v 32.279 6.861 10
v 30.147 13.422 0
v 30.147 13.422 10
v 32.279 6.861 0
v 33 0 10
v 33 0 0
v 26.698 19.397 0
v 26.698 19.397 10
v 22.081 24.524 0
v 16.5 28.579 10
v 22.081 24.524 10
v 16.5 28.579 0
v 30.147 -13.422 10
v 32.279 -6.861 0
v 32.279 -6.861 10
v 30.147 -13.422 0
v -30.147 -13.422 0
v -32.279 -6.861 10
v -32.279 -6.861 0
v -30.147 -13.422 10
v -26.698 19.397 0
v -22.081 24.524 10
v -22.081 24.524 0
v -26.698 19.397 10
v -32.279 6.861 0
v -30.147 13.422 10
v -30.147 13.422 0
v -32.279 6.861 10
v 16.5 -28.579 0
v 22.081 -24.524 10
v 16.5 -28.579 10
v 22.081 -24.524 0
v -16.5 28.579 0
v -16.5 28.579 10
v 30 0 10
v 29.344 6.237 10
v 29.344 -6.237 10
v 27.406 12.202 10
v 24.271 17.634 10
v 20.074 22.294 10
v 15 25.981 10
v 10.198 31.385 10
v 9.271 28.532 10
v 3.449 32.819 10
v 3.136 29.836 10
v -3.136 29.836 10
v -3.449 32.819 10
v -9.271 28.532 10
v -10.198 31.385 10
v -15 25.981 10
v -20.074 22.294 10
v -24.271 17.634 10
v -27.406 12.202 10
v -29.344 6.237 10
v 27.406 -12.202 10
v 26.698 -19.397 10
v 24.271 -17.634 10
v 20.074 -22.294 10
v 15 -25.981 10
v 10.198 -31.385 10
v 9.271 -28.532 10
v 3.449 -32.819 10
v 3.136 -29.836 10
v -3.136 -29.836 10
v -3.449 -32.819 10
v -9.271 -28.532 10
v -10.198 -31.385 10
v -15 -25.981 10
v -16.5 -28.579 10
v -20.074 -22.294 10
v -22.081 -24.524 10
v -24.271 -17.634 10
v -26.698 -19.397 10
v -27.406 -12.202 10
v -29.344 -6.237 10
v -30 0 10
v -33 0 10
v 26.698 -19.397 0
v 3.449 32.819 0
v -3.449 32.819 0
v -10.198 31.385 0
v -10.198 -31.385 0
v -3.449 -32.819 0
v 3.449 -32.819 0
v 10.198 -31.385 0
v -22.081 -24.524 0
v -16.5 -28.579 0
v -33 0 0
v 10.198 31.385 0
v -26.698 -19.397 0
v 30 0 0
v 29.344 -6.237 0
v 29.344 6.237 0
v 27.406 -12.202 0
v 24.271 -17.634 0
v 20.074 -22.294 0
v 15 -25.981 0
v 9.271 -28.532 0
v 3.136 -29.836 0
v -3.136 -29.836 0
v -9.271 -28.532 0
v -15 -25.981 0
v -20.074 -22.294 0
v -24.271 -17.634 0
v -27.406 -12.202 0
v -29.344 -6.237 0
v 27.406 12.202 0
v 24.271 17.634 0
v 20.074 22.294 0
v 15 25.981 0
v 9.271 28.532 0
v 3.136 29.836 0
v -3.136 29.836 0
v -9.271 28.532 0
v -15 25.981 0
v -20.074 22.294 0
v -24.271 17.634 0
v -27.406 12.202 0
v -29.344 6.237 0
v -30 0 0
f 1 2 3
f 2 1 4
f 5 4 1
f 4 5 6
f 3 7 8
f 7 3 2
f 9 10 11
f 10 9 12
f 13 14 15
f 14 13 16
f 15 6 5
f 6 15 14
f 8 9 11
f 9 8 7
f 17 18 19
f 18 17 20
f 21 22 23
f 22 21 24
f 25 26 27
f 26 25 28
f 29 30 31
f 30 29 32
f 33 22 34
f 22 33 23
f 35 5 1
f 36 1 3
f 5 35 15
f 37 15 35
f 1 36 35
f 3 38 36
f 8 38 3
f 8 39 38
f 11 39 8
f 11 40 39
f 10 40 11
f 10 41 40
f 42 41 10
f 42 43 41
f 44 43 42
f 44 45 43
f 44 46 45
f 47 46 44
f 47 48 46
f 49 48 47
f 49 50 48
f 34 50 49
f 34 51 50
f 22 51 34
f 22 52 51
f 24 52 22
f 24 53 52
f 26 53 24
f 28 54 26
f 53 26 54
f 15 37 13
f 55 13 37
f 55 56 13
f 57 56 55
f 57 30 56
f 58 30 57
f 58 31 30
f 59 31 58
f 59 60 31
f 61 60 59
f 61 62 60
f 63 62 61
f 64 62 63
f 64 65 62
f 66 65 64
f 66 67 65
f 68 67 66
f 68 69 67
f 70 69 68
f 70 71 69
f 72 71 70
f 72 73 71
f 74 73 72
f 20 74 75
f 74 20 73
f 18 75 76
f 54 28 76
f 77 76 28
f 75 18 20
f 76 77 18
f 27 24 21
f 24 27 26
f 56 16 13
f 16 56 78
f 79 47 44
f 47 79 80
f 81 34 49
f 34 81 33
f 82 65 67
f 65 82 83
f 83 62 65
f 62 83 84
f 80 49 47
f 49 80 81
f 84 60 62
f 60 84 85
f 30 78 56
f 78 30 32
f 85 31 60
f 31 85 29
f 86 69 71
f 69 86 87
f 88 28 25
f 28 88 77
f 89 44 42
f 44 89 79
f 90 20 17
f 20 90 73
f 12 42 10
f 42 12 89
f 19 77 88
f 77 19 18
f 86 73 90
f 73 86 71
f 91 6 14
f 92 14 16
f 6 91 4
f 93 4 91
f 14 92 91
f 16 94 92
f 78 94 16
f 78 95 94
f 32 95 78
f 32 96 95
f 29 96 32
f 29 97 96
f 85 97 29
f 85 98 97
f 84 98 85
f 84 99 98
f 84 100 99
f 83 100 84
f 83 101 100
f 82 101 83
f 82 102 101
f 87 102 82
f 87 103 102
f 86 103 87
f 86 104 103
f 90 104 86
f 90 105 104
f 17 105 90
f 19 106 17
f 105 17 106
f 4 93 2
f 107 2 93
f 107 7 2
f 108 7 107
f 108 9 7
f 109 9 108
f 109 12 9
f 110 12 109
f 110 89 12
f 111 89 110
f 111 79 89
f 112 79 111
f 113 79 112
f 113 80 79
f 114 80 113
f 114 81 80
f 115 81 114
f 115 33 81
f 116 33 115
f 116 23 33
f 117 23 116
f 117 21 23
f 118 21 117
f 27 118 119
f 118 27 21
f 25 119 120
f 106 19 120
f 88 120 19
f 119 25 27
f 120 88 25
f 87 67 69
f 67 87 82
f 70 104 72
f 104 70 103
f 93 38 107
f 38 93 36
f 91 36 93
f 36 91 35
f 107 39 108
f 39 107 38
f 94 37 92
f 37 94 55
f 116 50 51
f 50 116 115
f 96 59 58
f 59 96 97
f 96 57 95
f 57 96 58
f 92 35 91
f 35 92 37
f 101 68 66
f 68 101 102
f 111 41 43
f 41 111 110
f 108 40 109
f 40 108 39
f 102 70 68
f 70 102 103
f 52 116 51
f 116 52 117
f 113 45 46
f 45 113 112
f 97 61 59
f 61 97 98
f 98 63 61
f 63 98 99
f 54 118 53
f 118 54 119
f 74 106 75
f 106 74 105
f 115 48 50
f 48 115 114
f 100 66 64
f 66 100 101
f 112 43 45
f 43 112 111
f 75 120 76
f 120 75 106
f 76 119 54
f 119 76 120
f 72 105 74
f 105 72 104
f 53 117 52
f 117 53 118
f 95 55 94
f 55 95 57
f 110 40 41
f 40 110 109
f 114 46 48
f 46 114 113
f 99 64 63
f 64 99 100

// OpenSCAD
difference() {
	cylinder(h = 10, r=33, center=false);
	translate([0,0,-5]) cylinder(h = 20, r=30, center=false);
}
